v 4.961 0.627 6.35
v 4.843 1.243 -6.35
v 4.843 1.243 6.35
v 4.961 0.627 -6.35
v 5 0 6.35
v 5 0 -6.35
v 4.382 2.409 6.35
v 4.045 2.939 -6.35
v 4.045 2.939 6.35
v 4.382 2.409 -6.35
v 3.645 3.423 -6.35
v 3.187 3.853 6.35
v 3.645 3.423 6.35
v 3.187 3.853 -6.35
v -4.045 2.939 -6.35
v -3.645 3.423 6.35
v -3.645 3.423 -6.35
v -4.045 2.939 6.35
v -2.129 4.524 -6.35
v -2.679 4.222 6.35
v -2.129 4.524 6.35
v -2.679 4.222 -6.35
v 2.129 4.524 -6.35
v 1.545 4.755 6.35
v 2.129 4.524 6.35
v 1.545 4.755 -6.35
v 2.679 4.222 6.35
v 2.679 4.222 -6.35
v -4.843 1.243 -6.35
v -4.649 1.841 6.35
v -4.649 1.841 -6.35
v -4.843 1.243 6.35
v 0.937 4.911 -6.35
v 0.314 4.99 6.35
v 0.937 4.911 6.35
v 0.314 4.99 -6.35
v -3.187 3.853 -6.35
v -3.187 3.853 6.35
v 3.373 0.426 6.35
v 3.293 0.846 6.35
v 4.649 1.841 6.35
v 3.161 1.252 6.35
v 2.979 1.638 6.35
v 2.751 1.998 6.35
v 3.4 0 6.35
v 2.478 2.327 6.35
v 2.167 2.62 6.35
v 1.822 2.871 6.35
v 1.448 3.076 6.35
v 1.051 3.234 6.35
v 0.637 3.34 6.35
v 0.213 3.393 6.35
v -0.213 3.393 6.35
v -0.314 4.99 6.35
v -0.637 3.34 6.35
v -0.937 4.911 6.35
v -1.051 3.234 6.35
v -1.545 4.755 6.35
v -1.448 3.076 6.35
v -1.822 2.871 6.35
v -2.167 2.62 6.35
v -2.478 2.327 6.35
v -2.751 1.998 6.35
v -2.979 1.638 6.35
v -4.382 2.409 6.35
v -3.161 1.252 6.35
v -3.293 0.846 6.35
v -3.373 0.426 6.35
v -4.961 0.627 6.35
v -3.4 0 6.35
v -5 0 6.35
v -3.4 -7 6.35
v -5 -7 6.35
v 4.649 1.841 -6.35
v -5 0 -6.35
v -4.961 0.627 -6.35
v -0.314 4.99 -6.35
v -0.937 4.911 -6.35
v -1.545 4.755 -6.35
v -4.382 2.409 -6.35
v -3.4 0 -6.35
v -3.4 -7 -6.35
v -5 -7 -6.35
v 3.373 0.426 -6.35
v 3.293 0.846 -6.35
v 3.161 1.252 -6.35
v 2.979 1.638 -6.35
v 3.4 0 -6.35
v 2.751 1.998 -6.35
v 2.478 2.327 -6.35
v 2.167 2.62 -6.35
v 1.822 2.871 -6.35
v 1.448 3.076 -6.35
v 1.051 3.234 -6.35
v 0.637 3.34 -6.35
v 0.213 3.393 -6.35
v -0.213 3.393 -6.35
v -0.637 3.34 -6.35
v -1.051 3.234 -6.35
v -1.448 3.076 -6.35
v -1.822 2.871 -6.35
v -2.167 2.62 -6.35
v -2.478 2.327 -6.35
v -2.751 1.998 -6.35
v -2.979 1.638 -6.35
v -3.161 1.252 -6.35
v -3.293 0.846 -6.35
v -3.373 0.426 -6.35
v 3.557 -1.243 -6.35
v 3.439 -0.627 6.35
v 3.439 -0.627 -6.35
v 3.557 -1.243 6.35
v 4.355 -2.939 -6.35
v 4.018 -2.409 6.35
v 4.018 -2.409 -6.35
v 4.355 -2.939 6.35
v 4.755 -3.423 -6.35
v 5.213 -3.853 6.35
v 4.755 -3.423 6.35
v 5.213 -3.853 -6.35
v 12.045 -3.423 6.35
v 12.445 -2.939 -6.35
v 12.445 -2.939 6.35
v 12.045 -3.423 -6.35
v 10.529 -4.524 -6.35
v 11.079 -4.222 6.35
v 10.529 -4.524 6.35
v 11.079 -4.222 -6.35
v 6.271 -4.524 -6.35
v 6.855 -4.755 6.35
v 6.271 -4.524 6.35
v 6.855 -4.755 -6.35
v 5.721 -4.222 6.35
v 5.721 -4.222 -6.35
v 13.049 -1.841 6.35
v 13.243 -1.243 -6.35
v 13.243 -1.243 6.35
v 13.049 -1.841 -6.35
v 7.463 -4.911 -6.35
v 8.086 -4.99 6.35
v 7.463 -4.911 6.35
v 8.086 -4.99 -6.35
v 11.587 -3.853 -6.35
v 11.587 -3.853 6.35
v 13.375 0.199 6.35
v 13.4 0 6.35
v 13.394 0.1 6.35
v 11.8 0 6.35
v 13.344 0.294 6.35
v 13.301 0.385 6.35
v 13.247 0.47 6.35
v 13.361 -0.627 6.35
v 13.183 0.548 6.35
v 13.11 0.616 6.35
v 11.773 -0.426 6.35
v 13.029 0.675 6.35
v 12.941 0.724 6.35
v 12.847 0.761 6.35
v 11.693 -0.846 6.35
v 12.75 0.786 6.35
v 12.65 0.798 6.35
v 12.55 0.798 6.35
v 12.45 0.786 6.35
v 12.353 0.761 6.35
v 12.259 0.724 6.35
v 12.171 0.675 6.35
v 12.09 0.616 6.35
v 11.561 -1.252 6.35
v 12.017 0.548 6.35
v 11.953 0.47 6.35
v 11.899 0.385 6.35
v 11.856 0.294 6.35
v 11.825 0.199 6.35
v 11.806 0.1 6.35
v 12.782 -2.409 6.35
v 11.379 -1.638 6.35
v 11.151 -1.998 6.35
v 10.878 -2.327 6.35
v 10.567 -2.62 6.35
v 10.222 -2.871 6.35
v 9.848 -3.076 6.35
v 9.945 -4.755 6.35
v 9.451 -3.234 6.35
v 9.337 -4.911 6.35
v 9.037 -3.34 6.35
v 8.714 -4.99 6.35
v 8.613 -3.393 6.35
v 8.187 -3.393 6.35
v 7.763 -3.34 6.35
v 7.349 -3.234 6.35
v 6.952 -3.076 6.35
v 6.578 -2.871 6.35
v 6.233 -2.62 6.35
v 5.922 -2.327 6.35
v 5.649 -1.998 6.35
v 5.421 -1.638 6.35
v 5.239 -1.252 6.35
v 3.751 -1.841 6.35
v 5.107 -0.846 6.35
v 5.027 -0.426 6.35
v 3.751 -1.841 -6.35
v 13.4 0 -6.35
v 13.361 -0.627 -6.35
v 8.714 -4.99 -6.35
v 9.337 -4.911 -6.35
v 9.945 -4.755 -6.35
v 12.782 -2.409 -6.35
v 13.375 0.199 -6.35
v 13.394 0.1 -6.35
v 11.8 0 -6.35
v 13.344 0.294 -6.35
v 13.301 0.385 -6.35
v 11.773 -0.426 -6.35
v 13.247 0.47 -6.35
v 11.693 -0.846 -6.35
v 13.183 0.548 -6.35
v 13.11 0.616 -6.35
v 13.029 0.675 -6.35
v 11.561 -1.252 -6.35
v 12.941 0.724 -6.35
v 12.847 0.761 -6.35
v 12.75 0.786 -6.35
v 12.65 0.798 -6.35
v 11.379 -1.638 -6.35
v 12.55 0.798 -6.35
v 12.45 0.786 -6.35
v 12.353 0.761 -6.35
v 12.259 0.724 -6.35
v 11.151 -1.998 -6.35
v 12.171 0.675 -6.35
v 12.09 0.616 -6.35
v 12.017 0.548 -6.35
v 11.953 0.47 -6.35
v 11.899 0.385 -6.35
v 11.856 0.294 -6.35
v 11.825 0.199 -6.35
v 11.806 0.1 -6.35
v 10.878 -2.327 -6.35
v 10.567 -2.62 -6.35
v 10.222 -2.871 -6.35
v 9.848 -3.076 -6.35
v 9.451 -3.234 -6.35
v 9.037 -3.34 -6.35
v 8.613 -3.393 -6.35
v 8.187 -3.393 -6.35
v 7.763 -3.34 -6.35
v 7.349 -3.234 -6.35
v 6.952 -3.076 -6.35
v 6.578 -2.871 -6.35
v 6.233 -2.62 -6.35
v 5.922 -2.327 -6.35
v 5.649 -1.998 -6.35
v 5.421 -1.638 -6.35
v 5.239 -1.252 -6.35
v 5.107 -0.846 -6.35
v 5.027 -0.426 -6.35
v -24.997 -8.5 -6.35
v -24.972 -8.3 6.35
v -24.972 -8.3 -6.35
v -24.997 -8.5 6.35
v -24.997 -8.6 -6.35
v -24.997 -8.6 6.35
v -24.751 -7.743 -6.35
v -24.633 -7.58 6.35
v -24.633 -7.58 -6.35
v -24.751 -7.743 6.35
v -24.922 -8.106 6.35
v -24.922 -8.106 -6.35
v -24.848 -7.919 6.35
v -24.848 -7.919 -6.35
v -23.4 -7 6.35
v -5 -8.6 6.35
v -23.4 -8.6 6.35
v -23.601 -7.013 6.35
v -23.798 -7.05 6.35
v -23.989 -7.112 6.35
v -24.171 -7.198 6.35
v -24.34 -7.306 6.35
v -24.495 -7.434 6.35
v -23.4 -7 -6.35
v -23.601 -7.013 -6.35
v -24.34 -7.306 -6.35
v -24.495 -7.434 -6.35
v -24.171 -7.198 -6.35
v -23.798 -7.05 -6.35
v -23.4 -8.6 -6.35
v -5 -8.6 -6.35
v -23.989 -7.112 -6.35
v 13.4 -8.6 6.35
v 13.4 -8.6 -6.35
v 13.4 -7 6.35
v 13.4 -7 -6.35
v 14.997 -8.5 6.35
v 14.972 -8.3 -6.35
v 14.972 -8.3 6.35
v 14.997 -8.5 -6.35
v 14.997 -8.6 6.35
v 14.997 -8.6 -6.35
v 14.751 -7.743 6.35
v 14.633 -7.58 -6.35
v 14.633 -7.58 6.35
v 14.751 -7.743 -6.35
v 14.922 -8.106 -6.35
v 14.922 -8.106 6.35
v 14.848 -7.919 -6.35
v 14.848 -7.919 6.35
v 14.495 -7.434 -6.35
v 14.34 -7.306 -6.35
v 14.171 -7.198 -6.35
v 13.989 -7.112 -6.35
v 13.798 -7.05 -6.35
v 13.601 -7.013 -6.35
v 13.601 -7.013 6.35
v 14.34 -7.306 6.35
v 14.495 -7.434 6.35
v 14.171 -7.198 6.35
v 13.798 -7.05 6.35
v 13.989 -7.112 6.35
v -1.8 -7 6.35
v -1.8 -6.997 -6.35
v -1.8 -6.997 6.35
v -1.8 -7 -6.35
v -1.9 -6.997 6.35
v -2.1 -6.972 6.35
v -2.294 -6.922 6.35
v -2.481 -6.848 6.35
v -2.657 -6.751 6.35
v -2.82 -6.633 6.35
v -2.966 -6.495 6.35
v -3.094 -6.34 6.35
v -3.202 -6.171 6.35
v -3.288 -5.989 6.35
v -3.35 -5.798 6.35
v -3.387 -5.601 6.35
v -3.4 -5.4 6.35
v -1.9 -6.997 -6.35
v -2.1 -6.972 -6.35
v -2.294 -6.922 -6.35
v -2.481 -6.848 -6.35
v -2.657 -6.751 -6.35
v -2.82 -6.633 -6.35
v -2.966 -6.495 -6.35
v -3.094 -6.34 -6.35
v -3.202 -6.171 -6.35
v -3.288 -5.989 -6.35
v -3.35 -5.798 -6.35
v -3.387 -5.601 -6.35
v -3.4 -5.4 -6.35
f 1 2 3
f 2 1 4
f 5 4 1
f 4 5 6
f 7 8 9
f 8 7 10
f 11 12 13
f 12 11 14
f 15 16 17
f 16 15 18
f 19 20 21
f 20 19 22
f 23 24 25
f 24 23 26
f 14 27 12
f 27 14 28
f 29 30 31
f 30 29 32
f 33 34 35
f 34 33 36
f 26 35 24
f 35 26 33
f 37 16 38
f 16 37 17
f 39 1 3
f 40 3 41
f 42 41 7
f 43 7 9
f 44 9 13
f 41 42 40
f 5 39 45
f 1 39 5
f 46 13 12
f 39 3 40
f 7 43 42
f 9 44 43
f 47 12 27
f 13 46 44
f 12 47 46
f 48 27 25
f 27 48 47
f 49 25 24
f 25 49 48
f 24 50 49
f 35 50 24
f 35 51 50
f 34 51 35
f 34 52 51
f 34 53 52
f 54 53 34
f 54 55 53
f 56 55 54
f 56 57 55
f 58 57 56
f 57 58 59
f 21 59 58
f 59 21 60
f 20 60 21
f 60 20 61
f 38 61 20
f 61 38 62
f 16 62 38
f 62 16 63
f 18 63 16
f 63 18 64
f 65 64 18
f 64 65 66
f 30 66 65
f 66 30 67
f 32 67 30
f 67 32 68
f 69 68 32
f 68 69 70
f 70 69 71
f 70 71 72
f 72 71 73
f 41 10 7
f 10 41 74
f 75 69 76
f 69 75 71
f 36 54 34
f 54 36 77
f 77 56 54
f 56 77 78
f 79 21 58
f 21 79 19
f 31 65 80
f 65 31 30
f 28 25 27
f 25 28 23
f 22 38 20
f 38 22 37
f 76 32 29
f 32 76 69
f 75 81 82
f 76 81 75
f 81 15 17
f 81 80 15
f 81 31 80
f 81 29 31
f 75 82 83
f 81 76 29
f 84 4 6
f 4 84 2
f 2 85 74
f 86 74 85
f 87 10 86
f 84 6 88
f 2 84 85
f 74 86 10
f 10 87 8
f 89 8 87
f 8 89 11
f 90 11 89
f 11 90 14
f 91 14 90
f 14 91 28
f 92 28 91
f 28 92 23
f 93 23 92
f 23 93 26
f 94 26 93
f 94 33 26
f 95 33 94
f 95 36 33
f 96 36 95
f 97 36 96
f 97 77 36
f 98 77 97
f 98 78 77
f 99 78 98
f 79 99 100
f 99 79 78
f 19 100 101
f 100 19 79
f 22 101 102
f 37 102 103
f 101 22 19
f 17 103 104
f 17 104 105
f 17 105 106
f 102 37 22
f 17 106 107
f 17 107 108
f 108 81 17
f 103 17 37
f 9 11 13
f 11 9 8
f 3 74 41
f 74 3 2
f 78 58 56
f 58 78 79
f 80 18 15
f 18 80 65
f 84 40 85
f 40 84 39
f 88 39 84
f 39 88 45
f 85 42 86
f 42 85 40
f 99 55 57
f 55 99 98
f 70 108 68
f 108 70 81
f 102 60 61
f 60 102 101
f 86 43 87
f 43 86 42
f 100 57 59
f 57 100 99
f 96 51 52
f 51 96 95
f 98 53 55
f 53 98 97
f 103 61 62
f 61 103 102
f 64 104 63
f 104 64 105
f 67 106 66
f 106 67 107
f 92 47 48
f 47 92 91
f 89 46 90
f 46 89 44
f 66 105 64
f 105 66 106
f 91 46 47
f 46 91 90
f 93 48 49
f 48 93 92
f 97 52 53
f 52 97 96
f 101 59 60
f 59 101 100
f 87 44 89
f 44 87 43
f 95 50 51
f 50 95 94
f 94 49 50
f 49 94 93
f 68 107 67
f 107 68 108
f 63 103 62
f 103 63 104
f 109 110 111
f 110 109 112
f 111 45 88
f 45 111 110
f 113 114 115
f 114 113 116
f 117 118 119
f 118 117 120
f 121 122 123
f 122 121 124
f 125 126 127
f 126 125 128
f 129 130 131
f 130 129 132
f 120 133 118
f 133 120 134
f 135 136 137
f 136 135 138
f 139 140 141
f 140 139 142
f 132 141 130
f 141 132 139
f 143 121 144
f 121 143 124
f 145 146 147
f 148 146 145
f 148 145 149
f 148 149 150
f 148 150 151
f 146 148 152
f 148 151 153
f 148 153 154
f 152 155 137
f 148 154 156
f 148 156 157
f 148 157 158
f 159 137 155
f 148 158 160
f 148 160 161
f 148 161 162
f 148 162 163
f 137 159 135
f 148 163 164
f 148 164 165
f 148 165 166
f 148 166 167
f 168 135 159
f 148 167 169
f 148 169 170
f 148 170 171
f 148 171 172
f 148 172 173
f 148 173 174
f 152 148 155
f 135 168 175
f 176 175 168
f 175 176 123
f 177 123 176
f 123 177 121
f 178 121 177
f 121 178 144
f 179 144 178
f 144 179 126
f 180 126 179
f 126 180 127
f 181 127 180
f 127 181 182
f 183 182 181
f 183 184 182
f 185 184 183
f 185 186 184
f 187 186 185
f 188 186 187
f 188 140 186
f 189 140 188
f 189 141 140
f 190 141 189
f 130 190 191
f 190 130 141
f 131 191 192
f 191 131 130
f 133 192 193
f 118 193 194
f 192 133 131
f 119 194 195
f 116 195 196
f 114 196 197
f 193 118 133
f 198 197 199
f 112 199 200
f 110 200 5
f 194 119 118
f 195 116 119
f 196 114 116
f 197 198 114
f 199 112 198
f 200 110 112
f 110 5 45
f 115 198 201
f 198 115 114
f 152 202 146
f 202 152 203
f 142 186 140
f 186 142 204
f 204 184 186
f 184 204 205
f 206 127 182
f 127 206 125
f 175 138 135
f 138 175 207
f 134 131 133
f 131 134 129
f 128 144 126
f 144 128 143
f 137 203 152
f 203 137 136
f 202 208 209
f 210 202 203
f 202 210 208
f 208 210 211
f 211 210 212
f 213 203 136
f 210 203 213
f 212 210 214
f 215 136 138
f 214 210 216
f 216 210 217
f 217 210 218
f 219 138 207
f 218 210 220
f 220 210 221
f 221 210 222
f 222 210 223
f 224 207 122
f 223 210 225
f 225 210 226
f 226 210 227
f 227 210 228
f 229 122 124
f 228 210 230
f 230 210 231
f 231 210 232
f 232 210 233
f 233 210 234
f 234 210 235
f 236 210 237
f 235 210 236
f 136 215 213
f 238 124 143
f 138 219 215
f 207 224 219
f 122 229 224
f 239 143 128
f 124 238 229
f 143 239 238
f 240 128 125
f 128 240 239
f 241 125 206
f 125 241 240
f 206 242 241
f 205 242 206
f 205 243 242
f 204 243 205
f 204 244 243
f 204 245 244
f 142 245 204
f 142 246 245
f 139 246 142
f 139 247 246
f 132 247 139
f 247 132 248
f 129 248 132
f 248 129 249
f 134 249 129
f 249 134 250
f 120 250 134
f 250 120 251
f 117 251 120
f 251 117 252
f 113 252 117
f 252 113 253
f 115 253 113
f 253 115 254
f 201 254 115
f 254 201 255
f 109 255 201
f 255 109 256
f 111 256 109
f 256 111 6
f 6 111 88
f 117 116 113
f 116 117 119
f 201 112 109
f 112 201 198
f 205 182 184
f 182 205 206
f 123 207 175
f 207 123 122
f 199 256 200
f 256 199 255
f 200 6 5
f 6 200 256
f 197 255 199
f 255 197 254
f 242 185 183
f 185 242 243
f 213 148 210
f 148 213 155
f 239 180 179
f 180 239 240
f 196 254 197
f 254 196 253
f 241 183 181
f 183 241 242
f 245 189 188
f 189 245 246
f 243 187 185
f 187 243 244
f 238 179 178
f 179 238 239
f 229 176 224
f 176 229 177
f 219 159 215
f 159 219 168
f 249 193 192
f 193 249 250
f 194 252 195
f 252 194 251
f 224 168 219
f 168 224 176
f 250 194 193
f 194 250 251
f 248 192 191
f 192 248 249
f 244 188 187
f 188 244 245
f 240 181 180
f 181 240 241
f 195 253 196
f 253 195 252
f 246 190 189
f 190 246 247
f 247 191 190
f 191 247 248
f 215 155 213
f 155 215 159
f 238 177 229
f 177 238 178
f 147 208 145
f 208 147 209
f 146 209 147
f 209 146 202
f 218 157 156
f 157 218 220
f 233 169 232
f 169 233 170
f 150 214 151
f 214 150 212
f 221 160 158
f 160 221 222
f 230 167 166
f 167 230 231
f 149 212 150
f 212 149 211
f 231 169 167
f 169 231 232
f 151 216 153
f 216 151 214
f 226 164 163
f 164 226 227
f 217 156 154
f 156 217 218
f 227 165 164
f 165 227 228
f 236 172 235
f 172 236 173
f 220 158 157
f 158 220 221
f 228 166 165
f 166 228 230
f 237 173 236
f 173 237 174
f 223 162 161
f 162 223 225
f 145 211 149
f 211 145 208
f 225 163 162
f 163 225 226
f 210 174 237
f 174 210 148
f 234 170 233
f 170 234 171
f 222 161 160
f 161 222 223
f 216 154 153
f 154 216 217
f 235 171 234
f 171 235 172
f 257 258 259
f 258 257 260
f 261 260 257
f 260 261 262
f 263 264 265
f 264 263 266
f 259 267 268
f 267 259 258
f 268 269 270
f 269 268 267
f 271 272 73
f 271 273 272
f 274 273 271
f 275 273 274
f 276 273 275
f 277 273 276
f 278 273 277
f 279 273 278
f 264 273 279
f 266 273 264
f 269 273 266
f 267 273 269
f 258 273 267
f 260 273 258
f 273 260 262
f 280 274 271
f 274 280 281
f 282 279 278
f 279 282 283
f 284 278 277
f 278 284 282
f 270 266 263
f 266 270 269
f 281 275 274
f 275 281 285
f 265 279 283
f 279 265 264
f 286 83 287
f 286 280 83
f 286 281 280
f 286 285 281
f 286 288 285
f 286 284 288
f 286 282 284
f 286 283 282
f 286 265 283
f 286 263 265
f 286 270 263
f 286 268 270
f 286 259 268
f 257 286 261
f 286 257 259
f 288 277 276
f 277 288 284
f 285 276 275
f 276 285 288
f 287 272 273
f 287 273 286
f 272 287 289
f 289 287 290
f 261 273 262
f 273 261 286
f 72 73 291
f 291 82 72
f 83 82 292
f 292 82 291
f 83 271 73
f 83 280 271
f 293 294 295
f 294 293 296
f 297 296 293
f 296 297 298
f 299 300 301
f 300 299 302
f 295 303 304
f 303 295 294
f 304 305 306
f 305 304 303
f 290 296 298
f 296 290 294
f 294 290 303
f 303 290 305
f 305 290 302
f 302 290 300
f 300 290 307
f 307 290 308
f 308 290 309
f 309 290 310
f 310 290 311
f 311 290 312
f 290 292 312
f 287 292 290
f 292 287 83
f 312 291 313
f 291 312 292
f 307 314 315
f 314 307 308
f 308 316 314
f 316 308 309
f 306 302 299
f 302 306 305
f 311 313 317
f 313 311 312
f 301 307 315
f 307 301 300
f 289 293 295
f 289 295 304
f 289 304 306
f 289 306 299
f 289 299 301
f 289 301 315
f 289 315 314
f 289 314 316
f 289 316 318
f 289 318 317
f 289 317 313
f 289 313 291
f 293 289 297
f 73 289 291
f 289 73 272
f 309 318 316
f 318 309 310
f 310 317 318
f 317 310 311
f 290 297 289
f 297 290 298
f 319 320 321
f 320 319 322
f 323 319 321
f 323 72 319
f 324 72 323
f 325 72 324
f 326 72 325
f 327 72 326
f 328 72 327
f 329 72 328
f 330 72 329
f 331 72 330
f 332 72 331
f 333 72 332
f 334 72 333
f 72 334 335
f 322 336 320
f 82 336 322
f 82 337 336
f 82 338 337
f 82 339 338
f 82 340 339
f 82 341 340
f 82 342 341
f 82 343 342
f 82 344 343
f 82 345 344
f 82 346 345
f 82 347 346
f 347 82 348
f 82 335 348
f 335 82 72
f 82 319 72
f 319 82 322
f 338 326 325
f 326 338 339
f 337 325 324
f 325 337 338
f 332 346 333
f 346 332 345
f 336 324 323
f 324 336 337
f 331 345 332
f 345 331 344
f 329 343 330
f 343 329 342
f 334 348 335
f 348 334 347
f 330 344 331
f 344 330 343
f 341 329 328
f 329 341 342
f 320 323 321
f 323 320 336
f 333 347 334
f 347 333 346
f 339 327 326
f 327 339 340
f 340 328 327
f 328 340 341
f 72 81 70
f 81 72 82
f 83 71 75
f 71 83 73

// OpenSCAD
bend_d = 10;
arm_t = 1.6;
clip_w = 12.7;
fudge = 0.01;
clearance = 2;
side_len = bend_d * 2 - arm_t;

bend_r = bend_d / 2;
fillet_r = arm_t / 2;

module half_hollow() {
  difference() {
    cylinder(r=bend_r, h = clip_w, center=true, $fn = 50);
    cylinder(r=bend_r - arm_t, h = clip_w + fudge*2, center=true, $fn = 50);
    translate([0, -bend_r, 0])
      cube(size=[bend_d + fudge, bend_d, clip_w + fudge], center=true);
  }
}

module wave() {
  half_hollow();
  translate([bend_d - arm_t, 0, 0]) rotate([0, 0, 180]) half_hollow();
  translate([bend_d - arm_t + bend_r - fillet_r, 0, 0])
    cylinder(r=fillet_r, h=clip_w, center=true, $fn=50);
}

module ell_side(flip_fillet, flip_cut) {
  translate([0, 0, -clip_w/2]){
    cube(size=[arm_t, side_len, clip_w], center=false);
    difference() {
      translate([flip_fillet * arm_t, side_len, 0])
        cylinder(r=arm_t, h=clip_w, center=false, $fn=50);
      translate([arm_t * flip_cut, side_len - arm_t, 0])
        cube(size=[arm_t, arm_t *2, clip_w], center=false);
    }
  }
}

module corner(radius) {
  translate([radius, radius, -clip_w / 2])
  difference() {
    translate([-radius, -radius, 0])
      cube(size=[radius, radius, clip_w], center=false);
    cylinder(r=radius, h=clip_w, center=false, $fn=50);   
  }
}

module ell() {
  translate([-bend_r, -bend_r - clearance, 0]) {
   difference() {
    union() {
      translate([0, 0, -clip_w / 2])
        cube(size=[arm_t, bend_r + clearance, clip_w], center=false);
      rotate([0, 180, 90]) ell_side(1, 1);
	  rotate([0, 0, -90]) ell_side(1, 1);
      translate([arm_t, 0, 0])
        corner(arm_t);
    }
   //translate([0, -arm_t, 0])
   //corner(arm_t * 2);
   }
  }
}




wave();
ell();
